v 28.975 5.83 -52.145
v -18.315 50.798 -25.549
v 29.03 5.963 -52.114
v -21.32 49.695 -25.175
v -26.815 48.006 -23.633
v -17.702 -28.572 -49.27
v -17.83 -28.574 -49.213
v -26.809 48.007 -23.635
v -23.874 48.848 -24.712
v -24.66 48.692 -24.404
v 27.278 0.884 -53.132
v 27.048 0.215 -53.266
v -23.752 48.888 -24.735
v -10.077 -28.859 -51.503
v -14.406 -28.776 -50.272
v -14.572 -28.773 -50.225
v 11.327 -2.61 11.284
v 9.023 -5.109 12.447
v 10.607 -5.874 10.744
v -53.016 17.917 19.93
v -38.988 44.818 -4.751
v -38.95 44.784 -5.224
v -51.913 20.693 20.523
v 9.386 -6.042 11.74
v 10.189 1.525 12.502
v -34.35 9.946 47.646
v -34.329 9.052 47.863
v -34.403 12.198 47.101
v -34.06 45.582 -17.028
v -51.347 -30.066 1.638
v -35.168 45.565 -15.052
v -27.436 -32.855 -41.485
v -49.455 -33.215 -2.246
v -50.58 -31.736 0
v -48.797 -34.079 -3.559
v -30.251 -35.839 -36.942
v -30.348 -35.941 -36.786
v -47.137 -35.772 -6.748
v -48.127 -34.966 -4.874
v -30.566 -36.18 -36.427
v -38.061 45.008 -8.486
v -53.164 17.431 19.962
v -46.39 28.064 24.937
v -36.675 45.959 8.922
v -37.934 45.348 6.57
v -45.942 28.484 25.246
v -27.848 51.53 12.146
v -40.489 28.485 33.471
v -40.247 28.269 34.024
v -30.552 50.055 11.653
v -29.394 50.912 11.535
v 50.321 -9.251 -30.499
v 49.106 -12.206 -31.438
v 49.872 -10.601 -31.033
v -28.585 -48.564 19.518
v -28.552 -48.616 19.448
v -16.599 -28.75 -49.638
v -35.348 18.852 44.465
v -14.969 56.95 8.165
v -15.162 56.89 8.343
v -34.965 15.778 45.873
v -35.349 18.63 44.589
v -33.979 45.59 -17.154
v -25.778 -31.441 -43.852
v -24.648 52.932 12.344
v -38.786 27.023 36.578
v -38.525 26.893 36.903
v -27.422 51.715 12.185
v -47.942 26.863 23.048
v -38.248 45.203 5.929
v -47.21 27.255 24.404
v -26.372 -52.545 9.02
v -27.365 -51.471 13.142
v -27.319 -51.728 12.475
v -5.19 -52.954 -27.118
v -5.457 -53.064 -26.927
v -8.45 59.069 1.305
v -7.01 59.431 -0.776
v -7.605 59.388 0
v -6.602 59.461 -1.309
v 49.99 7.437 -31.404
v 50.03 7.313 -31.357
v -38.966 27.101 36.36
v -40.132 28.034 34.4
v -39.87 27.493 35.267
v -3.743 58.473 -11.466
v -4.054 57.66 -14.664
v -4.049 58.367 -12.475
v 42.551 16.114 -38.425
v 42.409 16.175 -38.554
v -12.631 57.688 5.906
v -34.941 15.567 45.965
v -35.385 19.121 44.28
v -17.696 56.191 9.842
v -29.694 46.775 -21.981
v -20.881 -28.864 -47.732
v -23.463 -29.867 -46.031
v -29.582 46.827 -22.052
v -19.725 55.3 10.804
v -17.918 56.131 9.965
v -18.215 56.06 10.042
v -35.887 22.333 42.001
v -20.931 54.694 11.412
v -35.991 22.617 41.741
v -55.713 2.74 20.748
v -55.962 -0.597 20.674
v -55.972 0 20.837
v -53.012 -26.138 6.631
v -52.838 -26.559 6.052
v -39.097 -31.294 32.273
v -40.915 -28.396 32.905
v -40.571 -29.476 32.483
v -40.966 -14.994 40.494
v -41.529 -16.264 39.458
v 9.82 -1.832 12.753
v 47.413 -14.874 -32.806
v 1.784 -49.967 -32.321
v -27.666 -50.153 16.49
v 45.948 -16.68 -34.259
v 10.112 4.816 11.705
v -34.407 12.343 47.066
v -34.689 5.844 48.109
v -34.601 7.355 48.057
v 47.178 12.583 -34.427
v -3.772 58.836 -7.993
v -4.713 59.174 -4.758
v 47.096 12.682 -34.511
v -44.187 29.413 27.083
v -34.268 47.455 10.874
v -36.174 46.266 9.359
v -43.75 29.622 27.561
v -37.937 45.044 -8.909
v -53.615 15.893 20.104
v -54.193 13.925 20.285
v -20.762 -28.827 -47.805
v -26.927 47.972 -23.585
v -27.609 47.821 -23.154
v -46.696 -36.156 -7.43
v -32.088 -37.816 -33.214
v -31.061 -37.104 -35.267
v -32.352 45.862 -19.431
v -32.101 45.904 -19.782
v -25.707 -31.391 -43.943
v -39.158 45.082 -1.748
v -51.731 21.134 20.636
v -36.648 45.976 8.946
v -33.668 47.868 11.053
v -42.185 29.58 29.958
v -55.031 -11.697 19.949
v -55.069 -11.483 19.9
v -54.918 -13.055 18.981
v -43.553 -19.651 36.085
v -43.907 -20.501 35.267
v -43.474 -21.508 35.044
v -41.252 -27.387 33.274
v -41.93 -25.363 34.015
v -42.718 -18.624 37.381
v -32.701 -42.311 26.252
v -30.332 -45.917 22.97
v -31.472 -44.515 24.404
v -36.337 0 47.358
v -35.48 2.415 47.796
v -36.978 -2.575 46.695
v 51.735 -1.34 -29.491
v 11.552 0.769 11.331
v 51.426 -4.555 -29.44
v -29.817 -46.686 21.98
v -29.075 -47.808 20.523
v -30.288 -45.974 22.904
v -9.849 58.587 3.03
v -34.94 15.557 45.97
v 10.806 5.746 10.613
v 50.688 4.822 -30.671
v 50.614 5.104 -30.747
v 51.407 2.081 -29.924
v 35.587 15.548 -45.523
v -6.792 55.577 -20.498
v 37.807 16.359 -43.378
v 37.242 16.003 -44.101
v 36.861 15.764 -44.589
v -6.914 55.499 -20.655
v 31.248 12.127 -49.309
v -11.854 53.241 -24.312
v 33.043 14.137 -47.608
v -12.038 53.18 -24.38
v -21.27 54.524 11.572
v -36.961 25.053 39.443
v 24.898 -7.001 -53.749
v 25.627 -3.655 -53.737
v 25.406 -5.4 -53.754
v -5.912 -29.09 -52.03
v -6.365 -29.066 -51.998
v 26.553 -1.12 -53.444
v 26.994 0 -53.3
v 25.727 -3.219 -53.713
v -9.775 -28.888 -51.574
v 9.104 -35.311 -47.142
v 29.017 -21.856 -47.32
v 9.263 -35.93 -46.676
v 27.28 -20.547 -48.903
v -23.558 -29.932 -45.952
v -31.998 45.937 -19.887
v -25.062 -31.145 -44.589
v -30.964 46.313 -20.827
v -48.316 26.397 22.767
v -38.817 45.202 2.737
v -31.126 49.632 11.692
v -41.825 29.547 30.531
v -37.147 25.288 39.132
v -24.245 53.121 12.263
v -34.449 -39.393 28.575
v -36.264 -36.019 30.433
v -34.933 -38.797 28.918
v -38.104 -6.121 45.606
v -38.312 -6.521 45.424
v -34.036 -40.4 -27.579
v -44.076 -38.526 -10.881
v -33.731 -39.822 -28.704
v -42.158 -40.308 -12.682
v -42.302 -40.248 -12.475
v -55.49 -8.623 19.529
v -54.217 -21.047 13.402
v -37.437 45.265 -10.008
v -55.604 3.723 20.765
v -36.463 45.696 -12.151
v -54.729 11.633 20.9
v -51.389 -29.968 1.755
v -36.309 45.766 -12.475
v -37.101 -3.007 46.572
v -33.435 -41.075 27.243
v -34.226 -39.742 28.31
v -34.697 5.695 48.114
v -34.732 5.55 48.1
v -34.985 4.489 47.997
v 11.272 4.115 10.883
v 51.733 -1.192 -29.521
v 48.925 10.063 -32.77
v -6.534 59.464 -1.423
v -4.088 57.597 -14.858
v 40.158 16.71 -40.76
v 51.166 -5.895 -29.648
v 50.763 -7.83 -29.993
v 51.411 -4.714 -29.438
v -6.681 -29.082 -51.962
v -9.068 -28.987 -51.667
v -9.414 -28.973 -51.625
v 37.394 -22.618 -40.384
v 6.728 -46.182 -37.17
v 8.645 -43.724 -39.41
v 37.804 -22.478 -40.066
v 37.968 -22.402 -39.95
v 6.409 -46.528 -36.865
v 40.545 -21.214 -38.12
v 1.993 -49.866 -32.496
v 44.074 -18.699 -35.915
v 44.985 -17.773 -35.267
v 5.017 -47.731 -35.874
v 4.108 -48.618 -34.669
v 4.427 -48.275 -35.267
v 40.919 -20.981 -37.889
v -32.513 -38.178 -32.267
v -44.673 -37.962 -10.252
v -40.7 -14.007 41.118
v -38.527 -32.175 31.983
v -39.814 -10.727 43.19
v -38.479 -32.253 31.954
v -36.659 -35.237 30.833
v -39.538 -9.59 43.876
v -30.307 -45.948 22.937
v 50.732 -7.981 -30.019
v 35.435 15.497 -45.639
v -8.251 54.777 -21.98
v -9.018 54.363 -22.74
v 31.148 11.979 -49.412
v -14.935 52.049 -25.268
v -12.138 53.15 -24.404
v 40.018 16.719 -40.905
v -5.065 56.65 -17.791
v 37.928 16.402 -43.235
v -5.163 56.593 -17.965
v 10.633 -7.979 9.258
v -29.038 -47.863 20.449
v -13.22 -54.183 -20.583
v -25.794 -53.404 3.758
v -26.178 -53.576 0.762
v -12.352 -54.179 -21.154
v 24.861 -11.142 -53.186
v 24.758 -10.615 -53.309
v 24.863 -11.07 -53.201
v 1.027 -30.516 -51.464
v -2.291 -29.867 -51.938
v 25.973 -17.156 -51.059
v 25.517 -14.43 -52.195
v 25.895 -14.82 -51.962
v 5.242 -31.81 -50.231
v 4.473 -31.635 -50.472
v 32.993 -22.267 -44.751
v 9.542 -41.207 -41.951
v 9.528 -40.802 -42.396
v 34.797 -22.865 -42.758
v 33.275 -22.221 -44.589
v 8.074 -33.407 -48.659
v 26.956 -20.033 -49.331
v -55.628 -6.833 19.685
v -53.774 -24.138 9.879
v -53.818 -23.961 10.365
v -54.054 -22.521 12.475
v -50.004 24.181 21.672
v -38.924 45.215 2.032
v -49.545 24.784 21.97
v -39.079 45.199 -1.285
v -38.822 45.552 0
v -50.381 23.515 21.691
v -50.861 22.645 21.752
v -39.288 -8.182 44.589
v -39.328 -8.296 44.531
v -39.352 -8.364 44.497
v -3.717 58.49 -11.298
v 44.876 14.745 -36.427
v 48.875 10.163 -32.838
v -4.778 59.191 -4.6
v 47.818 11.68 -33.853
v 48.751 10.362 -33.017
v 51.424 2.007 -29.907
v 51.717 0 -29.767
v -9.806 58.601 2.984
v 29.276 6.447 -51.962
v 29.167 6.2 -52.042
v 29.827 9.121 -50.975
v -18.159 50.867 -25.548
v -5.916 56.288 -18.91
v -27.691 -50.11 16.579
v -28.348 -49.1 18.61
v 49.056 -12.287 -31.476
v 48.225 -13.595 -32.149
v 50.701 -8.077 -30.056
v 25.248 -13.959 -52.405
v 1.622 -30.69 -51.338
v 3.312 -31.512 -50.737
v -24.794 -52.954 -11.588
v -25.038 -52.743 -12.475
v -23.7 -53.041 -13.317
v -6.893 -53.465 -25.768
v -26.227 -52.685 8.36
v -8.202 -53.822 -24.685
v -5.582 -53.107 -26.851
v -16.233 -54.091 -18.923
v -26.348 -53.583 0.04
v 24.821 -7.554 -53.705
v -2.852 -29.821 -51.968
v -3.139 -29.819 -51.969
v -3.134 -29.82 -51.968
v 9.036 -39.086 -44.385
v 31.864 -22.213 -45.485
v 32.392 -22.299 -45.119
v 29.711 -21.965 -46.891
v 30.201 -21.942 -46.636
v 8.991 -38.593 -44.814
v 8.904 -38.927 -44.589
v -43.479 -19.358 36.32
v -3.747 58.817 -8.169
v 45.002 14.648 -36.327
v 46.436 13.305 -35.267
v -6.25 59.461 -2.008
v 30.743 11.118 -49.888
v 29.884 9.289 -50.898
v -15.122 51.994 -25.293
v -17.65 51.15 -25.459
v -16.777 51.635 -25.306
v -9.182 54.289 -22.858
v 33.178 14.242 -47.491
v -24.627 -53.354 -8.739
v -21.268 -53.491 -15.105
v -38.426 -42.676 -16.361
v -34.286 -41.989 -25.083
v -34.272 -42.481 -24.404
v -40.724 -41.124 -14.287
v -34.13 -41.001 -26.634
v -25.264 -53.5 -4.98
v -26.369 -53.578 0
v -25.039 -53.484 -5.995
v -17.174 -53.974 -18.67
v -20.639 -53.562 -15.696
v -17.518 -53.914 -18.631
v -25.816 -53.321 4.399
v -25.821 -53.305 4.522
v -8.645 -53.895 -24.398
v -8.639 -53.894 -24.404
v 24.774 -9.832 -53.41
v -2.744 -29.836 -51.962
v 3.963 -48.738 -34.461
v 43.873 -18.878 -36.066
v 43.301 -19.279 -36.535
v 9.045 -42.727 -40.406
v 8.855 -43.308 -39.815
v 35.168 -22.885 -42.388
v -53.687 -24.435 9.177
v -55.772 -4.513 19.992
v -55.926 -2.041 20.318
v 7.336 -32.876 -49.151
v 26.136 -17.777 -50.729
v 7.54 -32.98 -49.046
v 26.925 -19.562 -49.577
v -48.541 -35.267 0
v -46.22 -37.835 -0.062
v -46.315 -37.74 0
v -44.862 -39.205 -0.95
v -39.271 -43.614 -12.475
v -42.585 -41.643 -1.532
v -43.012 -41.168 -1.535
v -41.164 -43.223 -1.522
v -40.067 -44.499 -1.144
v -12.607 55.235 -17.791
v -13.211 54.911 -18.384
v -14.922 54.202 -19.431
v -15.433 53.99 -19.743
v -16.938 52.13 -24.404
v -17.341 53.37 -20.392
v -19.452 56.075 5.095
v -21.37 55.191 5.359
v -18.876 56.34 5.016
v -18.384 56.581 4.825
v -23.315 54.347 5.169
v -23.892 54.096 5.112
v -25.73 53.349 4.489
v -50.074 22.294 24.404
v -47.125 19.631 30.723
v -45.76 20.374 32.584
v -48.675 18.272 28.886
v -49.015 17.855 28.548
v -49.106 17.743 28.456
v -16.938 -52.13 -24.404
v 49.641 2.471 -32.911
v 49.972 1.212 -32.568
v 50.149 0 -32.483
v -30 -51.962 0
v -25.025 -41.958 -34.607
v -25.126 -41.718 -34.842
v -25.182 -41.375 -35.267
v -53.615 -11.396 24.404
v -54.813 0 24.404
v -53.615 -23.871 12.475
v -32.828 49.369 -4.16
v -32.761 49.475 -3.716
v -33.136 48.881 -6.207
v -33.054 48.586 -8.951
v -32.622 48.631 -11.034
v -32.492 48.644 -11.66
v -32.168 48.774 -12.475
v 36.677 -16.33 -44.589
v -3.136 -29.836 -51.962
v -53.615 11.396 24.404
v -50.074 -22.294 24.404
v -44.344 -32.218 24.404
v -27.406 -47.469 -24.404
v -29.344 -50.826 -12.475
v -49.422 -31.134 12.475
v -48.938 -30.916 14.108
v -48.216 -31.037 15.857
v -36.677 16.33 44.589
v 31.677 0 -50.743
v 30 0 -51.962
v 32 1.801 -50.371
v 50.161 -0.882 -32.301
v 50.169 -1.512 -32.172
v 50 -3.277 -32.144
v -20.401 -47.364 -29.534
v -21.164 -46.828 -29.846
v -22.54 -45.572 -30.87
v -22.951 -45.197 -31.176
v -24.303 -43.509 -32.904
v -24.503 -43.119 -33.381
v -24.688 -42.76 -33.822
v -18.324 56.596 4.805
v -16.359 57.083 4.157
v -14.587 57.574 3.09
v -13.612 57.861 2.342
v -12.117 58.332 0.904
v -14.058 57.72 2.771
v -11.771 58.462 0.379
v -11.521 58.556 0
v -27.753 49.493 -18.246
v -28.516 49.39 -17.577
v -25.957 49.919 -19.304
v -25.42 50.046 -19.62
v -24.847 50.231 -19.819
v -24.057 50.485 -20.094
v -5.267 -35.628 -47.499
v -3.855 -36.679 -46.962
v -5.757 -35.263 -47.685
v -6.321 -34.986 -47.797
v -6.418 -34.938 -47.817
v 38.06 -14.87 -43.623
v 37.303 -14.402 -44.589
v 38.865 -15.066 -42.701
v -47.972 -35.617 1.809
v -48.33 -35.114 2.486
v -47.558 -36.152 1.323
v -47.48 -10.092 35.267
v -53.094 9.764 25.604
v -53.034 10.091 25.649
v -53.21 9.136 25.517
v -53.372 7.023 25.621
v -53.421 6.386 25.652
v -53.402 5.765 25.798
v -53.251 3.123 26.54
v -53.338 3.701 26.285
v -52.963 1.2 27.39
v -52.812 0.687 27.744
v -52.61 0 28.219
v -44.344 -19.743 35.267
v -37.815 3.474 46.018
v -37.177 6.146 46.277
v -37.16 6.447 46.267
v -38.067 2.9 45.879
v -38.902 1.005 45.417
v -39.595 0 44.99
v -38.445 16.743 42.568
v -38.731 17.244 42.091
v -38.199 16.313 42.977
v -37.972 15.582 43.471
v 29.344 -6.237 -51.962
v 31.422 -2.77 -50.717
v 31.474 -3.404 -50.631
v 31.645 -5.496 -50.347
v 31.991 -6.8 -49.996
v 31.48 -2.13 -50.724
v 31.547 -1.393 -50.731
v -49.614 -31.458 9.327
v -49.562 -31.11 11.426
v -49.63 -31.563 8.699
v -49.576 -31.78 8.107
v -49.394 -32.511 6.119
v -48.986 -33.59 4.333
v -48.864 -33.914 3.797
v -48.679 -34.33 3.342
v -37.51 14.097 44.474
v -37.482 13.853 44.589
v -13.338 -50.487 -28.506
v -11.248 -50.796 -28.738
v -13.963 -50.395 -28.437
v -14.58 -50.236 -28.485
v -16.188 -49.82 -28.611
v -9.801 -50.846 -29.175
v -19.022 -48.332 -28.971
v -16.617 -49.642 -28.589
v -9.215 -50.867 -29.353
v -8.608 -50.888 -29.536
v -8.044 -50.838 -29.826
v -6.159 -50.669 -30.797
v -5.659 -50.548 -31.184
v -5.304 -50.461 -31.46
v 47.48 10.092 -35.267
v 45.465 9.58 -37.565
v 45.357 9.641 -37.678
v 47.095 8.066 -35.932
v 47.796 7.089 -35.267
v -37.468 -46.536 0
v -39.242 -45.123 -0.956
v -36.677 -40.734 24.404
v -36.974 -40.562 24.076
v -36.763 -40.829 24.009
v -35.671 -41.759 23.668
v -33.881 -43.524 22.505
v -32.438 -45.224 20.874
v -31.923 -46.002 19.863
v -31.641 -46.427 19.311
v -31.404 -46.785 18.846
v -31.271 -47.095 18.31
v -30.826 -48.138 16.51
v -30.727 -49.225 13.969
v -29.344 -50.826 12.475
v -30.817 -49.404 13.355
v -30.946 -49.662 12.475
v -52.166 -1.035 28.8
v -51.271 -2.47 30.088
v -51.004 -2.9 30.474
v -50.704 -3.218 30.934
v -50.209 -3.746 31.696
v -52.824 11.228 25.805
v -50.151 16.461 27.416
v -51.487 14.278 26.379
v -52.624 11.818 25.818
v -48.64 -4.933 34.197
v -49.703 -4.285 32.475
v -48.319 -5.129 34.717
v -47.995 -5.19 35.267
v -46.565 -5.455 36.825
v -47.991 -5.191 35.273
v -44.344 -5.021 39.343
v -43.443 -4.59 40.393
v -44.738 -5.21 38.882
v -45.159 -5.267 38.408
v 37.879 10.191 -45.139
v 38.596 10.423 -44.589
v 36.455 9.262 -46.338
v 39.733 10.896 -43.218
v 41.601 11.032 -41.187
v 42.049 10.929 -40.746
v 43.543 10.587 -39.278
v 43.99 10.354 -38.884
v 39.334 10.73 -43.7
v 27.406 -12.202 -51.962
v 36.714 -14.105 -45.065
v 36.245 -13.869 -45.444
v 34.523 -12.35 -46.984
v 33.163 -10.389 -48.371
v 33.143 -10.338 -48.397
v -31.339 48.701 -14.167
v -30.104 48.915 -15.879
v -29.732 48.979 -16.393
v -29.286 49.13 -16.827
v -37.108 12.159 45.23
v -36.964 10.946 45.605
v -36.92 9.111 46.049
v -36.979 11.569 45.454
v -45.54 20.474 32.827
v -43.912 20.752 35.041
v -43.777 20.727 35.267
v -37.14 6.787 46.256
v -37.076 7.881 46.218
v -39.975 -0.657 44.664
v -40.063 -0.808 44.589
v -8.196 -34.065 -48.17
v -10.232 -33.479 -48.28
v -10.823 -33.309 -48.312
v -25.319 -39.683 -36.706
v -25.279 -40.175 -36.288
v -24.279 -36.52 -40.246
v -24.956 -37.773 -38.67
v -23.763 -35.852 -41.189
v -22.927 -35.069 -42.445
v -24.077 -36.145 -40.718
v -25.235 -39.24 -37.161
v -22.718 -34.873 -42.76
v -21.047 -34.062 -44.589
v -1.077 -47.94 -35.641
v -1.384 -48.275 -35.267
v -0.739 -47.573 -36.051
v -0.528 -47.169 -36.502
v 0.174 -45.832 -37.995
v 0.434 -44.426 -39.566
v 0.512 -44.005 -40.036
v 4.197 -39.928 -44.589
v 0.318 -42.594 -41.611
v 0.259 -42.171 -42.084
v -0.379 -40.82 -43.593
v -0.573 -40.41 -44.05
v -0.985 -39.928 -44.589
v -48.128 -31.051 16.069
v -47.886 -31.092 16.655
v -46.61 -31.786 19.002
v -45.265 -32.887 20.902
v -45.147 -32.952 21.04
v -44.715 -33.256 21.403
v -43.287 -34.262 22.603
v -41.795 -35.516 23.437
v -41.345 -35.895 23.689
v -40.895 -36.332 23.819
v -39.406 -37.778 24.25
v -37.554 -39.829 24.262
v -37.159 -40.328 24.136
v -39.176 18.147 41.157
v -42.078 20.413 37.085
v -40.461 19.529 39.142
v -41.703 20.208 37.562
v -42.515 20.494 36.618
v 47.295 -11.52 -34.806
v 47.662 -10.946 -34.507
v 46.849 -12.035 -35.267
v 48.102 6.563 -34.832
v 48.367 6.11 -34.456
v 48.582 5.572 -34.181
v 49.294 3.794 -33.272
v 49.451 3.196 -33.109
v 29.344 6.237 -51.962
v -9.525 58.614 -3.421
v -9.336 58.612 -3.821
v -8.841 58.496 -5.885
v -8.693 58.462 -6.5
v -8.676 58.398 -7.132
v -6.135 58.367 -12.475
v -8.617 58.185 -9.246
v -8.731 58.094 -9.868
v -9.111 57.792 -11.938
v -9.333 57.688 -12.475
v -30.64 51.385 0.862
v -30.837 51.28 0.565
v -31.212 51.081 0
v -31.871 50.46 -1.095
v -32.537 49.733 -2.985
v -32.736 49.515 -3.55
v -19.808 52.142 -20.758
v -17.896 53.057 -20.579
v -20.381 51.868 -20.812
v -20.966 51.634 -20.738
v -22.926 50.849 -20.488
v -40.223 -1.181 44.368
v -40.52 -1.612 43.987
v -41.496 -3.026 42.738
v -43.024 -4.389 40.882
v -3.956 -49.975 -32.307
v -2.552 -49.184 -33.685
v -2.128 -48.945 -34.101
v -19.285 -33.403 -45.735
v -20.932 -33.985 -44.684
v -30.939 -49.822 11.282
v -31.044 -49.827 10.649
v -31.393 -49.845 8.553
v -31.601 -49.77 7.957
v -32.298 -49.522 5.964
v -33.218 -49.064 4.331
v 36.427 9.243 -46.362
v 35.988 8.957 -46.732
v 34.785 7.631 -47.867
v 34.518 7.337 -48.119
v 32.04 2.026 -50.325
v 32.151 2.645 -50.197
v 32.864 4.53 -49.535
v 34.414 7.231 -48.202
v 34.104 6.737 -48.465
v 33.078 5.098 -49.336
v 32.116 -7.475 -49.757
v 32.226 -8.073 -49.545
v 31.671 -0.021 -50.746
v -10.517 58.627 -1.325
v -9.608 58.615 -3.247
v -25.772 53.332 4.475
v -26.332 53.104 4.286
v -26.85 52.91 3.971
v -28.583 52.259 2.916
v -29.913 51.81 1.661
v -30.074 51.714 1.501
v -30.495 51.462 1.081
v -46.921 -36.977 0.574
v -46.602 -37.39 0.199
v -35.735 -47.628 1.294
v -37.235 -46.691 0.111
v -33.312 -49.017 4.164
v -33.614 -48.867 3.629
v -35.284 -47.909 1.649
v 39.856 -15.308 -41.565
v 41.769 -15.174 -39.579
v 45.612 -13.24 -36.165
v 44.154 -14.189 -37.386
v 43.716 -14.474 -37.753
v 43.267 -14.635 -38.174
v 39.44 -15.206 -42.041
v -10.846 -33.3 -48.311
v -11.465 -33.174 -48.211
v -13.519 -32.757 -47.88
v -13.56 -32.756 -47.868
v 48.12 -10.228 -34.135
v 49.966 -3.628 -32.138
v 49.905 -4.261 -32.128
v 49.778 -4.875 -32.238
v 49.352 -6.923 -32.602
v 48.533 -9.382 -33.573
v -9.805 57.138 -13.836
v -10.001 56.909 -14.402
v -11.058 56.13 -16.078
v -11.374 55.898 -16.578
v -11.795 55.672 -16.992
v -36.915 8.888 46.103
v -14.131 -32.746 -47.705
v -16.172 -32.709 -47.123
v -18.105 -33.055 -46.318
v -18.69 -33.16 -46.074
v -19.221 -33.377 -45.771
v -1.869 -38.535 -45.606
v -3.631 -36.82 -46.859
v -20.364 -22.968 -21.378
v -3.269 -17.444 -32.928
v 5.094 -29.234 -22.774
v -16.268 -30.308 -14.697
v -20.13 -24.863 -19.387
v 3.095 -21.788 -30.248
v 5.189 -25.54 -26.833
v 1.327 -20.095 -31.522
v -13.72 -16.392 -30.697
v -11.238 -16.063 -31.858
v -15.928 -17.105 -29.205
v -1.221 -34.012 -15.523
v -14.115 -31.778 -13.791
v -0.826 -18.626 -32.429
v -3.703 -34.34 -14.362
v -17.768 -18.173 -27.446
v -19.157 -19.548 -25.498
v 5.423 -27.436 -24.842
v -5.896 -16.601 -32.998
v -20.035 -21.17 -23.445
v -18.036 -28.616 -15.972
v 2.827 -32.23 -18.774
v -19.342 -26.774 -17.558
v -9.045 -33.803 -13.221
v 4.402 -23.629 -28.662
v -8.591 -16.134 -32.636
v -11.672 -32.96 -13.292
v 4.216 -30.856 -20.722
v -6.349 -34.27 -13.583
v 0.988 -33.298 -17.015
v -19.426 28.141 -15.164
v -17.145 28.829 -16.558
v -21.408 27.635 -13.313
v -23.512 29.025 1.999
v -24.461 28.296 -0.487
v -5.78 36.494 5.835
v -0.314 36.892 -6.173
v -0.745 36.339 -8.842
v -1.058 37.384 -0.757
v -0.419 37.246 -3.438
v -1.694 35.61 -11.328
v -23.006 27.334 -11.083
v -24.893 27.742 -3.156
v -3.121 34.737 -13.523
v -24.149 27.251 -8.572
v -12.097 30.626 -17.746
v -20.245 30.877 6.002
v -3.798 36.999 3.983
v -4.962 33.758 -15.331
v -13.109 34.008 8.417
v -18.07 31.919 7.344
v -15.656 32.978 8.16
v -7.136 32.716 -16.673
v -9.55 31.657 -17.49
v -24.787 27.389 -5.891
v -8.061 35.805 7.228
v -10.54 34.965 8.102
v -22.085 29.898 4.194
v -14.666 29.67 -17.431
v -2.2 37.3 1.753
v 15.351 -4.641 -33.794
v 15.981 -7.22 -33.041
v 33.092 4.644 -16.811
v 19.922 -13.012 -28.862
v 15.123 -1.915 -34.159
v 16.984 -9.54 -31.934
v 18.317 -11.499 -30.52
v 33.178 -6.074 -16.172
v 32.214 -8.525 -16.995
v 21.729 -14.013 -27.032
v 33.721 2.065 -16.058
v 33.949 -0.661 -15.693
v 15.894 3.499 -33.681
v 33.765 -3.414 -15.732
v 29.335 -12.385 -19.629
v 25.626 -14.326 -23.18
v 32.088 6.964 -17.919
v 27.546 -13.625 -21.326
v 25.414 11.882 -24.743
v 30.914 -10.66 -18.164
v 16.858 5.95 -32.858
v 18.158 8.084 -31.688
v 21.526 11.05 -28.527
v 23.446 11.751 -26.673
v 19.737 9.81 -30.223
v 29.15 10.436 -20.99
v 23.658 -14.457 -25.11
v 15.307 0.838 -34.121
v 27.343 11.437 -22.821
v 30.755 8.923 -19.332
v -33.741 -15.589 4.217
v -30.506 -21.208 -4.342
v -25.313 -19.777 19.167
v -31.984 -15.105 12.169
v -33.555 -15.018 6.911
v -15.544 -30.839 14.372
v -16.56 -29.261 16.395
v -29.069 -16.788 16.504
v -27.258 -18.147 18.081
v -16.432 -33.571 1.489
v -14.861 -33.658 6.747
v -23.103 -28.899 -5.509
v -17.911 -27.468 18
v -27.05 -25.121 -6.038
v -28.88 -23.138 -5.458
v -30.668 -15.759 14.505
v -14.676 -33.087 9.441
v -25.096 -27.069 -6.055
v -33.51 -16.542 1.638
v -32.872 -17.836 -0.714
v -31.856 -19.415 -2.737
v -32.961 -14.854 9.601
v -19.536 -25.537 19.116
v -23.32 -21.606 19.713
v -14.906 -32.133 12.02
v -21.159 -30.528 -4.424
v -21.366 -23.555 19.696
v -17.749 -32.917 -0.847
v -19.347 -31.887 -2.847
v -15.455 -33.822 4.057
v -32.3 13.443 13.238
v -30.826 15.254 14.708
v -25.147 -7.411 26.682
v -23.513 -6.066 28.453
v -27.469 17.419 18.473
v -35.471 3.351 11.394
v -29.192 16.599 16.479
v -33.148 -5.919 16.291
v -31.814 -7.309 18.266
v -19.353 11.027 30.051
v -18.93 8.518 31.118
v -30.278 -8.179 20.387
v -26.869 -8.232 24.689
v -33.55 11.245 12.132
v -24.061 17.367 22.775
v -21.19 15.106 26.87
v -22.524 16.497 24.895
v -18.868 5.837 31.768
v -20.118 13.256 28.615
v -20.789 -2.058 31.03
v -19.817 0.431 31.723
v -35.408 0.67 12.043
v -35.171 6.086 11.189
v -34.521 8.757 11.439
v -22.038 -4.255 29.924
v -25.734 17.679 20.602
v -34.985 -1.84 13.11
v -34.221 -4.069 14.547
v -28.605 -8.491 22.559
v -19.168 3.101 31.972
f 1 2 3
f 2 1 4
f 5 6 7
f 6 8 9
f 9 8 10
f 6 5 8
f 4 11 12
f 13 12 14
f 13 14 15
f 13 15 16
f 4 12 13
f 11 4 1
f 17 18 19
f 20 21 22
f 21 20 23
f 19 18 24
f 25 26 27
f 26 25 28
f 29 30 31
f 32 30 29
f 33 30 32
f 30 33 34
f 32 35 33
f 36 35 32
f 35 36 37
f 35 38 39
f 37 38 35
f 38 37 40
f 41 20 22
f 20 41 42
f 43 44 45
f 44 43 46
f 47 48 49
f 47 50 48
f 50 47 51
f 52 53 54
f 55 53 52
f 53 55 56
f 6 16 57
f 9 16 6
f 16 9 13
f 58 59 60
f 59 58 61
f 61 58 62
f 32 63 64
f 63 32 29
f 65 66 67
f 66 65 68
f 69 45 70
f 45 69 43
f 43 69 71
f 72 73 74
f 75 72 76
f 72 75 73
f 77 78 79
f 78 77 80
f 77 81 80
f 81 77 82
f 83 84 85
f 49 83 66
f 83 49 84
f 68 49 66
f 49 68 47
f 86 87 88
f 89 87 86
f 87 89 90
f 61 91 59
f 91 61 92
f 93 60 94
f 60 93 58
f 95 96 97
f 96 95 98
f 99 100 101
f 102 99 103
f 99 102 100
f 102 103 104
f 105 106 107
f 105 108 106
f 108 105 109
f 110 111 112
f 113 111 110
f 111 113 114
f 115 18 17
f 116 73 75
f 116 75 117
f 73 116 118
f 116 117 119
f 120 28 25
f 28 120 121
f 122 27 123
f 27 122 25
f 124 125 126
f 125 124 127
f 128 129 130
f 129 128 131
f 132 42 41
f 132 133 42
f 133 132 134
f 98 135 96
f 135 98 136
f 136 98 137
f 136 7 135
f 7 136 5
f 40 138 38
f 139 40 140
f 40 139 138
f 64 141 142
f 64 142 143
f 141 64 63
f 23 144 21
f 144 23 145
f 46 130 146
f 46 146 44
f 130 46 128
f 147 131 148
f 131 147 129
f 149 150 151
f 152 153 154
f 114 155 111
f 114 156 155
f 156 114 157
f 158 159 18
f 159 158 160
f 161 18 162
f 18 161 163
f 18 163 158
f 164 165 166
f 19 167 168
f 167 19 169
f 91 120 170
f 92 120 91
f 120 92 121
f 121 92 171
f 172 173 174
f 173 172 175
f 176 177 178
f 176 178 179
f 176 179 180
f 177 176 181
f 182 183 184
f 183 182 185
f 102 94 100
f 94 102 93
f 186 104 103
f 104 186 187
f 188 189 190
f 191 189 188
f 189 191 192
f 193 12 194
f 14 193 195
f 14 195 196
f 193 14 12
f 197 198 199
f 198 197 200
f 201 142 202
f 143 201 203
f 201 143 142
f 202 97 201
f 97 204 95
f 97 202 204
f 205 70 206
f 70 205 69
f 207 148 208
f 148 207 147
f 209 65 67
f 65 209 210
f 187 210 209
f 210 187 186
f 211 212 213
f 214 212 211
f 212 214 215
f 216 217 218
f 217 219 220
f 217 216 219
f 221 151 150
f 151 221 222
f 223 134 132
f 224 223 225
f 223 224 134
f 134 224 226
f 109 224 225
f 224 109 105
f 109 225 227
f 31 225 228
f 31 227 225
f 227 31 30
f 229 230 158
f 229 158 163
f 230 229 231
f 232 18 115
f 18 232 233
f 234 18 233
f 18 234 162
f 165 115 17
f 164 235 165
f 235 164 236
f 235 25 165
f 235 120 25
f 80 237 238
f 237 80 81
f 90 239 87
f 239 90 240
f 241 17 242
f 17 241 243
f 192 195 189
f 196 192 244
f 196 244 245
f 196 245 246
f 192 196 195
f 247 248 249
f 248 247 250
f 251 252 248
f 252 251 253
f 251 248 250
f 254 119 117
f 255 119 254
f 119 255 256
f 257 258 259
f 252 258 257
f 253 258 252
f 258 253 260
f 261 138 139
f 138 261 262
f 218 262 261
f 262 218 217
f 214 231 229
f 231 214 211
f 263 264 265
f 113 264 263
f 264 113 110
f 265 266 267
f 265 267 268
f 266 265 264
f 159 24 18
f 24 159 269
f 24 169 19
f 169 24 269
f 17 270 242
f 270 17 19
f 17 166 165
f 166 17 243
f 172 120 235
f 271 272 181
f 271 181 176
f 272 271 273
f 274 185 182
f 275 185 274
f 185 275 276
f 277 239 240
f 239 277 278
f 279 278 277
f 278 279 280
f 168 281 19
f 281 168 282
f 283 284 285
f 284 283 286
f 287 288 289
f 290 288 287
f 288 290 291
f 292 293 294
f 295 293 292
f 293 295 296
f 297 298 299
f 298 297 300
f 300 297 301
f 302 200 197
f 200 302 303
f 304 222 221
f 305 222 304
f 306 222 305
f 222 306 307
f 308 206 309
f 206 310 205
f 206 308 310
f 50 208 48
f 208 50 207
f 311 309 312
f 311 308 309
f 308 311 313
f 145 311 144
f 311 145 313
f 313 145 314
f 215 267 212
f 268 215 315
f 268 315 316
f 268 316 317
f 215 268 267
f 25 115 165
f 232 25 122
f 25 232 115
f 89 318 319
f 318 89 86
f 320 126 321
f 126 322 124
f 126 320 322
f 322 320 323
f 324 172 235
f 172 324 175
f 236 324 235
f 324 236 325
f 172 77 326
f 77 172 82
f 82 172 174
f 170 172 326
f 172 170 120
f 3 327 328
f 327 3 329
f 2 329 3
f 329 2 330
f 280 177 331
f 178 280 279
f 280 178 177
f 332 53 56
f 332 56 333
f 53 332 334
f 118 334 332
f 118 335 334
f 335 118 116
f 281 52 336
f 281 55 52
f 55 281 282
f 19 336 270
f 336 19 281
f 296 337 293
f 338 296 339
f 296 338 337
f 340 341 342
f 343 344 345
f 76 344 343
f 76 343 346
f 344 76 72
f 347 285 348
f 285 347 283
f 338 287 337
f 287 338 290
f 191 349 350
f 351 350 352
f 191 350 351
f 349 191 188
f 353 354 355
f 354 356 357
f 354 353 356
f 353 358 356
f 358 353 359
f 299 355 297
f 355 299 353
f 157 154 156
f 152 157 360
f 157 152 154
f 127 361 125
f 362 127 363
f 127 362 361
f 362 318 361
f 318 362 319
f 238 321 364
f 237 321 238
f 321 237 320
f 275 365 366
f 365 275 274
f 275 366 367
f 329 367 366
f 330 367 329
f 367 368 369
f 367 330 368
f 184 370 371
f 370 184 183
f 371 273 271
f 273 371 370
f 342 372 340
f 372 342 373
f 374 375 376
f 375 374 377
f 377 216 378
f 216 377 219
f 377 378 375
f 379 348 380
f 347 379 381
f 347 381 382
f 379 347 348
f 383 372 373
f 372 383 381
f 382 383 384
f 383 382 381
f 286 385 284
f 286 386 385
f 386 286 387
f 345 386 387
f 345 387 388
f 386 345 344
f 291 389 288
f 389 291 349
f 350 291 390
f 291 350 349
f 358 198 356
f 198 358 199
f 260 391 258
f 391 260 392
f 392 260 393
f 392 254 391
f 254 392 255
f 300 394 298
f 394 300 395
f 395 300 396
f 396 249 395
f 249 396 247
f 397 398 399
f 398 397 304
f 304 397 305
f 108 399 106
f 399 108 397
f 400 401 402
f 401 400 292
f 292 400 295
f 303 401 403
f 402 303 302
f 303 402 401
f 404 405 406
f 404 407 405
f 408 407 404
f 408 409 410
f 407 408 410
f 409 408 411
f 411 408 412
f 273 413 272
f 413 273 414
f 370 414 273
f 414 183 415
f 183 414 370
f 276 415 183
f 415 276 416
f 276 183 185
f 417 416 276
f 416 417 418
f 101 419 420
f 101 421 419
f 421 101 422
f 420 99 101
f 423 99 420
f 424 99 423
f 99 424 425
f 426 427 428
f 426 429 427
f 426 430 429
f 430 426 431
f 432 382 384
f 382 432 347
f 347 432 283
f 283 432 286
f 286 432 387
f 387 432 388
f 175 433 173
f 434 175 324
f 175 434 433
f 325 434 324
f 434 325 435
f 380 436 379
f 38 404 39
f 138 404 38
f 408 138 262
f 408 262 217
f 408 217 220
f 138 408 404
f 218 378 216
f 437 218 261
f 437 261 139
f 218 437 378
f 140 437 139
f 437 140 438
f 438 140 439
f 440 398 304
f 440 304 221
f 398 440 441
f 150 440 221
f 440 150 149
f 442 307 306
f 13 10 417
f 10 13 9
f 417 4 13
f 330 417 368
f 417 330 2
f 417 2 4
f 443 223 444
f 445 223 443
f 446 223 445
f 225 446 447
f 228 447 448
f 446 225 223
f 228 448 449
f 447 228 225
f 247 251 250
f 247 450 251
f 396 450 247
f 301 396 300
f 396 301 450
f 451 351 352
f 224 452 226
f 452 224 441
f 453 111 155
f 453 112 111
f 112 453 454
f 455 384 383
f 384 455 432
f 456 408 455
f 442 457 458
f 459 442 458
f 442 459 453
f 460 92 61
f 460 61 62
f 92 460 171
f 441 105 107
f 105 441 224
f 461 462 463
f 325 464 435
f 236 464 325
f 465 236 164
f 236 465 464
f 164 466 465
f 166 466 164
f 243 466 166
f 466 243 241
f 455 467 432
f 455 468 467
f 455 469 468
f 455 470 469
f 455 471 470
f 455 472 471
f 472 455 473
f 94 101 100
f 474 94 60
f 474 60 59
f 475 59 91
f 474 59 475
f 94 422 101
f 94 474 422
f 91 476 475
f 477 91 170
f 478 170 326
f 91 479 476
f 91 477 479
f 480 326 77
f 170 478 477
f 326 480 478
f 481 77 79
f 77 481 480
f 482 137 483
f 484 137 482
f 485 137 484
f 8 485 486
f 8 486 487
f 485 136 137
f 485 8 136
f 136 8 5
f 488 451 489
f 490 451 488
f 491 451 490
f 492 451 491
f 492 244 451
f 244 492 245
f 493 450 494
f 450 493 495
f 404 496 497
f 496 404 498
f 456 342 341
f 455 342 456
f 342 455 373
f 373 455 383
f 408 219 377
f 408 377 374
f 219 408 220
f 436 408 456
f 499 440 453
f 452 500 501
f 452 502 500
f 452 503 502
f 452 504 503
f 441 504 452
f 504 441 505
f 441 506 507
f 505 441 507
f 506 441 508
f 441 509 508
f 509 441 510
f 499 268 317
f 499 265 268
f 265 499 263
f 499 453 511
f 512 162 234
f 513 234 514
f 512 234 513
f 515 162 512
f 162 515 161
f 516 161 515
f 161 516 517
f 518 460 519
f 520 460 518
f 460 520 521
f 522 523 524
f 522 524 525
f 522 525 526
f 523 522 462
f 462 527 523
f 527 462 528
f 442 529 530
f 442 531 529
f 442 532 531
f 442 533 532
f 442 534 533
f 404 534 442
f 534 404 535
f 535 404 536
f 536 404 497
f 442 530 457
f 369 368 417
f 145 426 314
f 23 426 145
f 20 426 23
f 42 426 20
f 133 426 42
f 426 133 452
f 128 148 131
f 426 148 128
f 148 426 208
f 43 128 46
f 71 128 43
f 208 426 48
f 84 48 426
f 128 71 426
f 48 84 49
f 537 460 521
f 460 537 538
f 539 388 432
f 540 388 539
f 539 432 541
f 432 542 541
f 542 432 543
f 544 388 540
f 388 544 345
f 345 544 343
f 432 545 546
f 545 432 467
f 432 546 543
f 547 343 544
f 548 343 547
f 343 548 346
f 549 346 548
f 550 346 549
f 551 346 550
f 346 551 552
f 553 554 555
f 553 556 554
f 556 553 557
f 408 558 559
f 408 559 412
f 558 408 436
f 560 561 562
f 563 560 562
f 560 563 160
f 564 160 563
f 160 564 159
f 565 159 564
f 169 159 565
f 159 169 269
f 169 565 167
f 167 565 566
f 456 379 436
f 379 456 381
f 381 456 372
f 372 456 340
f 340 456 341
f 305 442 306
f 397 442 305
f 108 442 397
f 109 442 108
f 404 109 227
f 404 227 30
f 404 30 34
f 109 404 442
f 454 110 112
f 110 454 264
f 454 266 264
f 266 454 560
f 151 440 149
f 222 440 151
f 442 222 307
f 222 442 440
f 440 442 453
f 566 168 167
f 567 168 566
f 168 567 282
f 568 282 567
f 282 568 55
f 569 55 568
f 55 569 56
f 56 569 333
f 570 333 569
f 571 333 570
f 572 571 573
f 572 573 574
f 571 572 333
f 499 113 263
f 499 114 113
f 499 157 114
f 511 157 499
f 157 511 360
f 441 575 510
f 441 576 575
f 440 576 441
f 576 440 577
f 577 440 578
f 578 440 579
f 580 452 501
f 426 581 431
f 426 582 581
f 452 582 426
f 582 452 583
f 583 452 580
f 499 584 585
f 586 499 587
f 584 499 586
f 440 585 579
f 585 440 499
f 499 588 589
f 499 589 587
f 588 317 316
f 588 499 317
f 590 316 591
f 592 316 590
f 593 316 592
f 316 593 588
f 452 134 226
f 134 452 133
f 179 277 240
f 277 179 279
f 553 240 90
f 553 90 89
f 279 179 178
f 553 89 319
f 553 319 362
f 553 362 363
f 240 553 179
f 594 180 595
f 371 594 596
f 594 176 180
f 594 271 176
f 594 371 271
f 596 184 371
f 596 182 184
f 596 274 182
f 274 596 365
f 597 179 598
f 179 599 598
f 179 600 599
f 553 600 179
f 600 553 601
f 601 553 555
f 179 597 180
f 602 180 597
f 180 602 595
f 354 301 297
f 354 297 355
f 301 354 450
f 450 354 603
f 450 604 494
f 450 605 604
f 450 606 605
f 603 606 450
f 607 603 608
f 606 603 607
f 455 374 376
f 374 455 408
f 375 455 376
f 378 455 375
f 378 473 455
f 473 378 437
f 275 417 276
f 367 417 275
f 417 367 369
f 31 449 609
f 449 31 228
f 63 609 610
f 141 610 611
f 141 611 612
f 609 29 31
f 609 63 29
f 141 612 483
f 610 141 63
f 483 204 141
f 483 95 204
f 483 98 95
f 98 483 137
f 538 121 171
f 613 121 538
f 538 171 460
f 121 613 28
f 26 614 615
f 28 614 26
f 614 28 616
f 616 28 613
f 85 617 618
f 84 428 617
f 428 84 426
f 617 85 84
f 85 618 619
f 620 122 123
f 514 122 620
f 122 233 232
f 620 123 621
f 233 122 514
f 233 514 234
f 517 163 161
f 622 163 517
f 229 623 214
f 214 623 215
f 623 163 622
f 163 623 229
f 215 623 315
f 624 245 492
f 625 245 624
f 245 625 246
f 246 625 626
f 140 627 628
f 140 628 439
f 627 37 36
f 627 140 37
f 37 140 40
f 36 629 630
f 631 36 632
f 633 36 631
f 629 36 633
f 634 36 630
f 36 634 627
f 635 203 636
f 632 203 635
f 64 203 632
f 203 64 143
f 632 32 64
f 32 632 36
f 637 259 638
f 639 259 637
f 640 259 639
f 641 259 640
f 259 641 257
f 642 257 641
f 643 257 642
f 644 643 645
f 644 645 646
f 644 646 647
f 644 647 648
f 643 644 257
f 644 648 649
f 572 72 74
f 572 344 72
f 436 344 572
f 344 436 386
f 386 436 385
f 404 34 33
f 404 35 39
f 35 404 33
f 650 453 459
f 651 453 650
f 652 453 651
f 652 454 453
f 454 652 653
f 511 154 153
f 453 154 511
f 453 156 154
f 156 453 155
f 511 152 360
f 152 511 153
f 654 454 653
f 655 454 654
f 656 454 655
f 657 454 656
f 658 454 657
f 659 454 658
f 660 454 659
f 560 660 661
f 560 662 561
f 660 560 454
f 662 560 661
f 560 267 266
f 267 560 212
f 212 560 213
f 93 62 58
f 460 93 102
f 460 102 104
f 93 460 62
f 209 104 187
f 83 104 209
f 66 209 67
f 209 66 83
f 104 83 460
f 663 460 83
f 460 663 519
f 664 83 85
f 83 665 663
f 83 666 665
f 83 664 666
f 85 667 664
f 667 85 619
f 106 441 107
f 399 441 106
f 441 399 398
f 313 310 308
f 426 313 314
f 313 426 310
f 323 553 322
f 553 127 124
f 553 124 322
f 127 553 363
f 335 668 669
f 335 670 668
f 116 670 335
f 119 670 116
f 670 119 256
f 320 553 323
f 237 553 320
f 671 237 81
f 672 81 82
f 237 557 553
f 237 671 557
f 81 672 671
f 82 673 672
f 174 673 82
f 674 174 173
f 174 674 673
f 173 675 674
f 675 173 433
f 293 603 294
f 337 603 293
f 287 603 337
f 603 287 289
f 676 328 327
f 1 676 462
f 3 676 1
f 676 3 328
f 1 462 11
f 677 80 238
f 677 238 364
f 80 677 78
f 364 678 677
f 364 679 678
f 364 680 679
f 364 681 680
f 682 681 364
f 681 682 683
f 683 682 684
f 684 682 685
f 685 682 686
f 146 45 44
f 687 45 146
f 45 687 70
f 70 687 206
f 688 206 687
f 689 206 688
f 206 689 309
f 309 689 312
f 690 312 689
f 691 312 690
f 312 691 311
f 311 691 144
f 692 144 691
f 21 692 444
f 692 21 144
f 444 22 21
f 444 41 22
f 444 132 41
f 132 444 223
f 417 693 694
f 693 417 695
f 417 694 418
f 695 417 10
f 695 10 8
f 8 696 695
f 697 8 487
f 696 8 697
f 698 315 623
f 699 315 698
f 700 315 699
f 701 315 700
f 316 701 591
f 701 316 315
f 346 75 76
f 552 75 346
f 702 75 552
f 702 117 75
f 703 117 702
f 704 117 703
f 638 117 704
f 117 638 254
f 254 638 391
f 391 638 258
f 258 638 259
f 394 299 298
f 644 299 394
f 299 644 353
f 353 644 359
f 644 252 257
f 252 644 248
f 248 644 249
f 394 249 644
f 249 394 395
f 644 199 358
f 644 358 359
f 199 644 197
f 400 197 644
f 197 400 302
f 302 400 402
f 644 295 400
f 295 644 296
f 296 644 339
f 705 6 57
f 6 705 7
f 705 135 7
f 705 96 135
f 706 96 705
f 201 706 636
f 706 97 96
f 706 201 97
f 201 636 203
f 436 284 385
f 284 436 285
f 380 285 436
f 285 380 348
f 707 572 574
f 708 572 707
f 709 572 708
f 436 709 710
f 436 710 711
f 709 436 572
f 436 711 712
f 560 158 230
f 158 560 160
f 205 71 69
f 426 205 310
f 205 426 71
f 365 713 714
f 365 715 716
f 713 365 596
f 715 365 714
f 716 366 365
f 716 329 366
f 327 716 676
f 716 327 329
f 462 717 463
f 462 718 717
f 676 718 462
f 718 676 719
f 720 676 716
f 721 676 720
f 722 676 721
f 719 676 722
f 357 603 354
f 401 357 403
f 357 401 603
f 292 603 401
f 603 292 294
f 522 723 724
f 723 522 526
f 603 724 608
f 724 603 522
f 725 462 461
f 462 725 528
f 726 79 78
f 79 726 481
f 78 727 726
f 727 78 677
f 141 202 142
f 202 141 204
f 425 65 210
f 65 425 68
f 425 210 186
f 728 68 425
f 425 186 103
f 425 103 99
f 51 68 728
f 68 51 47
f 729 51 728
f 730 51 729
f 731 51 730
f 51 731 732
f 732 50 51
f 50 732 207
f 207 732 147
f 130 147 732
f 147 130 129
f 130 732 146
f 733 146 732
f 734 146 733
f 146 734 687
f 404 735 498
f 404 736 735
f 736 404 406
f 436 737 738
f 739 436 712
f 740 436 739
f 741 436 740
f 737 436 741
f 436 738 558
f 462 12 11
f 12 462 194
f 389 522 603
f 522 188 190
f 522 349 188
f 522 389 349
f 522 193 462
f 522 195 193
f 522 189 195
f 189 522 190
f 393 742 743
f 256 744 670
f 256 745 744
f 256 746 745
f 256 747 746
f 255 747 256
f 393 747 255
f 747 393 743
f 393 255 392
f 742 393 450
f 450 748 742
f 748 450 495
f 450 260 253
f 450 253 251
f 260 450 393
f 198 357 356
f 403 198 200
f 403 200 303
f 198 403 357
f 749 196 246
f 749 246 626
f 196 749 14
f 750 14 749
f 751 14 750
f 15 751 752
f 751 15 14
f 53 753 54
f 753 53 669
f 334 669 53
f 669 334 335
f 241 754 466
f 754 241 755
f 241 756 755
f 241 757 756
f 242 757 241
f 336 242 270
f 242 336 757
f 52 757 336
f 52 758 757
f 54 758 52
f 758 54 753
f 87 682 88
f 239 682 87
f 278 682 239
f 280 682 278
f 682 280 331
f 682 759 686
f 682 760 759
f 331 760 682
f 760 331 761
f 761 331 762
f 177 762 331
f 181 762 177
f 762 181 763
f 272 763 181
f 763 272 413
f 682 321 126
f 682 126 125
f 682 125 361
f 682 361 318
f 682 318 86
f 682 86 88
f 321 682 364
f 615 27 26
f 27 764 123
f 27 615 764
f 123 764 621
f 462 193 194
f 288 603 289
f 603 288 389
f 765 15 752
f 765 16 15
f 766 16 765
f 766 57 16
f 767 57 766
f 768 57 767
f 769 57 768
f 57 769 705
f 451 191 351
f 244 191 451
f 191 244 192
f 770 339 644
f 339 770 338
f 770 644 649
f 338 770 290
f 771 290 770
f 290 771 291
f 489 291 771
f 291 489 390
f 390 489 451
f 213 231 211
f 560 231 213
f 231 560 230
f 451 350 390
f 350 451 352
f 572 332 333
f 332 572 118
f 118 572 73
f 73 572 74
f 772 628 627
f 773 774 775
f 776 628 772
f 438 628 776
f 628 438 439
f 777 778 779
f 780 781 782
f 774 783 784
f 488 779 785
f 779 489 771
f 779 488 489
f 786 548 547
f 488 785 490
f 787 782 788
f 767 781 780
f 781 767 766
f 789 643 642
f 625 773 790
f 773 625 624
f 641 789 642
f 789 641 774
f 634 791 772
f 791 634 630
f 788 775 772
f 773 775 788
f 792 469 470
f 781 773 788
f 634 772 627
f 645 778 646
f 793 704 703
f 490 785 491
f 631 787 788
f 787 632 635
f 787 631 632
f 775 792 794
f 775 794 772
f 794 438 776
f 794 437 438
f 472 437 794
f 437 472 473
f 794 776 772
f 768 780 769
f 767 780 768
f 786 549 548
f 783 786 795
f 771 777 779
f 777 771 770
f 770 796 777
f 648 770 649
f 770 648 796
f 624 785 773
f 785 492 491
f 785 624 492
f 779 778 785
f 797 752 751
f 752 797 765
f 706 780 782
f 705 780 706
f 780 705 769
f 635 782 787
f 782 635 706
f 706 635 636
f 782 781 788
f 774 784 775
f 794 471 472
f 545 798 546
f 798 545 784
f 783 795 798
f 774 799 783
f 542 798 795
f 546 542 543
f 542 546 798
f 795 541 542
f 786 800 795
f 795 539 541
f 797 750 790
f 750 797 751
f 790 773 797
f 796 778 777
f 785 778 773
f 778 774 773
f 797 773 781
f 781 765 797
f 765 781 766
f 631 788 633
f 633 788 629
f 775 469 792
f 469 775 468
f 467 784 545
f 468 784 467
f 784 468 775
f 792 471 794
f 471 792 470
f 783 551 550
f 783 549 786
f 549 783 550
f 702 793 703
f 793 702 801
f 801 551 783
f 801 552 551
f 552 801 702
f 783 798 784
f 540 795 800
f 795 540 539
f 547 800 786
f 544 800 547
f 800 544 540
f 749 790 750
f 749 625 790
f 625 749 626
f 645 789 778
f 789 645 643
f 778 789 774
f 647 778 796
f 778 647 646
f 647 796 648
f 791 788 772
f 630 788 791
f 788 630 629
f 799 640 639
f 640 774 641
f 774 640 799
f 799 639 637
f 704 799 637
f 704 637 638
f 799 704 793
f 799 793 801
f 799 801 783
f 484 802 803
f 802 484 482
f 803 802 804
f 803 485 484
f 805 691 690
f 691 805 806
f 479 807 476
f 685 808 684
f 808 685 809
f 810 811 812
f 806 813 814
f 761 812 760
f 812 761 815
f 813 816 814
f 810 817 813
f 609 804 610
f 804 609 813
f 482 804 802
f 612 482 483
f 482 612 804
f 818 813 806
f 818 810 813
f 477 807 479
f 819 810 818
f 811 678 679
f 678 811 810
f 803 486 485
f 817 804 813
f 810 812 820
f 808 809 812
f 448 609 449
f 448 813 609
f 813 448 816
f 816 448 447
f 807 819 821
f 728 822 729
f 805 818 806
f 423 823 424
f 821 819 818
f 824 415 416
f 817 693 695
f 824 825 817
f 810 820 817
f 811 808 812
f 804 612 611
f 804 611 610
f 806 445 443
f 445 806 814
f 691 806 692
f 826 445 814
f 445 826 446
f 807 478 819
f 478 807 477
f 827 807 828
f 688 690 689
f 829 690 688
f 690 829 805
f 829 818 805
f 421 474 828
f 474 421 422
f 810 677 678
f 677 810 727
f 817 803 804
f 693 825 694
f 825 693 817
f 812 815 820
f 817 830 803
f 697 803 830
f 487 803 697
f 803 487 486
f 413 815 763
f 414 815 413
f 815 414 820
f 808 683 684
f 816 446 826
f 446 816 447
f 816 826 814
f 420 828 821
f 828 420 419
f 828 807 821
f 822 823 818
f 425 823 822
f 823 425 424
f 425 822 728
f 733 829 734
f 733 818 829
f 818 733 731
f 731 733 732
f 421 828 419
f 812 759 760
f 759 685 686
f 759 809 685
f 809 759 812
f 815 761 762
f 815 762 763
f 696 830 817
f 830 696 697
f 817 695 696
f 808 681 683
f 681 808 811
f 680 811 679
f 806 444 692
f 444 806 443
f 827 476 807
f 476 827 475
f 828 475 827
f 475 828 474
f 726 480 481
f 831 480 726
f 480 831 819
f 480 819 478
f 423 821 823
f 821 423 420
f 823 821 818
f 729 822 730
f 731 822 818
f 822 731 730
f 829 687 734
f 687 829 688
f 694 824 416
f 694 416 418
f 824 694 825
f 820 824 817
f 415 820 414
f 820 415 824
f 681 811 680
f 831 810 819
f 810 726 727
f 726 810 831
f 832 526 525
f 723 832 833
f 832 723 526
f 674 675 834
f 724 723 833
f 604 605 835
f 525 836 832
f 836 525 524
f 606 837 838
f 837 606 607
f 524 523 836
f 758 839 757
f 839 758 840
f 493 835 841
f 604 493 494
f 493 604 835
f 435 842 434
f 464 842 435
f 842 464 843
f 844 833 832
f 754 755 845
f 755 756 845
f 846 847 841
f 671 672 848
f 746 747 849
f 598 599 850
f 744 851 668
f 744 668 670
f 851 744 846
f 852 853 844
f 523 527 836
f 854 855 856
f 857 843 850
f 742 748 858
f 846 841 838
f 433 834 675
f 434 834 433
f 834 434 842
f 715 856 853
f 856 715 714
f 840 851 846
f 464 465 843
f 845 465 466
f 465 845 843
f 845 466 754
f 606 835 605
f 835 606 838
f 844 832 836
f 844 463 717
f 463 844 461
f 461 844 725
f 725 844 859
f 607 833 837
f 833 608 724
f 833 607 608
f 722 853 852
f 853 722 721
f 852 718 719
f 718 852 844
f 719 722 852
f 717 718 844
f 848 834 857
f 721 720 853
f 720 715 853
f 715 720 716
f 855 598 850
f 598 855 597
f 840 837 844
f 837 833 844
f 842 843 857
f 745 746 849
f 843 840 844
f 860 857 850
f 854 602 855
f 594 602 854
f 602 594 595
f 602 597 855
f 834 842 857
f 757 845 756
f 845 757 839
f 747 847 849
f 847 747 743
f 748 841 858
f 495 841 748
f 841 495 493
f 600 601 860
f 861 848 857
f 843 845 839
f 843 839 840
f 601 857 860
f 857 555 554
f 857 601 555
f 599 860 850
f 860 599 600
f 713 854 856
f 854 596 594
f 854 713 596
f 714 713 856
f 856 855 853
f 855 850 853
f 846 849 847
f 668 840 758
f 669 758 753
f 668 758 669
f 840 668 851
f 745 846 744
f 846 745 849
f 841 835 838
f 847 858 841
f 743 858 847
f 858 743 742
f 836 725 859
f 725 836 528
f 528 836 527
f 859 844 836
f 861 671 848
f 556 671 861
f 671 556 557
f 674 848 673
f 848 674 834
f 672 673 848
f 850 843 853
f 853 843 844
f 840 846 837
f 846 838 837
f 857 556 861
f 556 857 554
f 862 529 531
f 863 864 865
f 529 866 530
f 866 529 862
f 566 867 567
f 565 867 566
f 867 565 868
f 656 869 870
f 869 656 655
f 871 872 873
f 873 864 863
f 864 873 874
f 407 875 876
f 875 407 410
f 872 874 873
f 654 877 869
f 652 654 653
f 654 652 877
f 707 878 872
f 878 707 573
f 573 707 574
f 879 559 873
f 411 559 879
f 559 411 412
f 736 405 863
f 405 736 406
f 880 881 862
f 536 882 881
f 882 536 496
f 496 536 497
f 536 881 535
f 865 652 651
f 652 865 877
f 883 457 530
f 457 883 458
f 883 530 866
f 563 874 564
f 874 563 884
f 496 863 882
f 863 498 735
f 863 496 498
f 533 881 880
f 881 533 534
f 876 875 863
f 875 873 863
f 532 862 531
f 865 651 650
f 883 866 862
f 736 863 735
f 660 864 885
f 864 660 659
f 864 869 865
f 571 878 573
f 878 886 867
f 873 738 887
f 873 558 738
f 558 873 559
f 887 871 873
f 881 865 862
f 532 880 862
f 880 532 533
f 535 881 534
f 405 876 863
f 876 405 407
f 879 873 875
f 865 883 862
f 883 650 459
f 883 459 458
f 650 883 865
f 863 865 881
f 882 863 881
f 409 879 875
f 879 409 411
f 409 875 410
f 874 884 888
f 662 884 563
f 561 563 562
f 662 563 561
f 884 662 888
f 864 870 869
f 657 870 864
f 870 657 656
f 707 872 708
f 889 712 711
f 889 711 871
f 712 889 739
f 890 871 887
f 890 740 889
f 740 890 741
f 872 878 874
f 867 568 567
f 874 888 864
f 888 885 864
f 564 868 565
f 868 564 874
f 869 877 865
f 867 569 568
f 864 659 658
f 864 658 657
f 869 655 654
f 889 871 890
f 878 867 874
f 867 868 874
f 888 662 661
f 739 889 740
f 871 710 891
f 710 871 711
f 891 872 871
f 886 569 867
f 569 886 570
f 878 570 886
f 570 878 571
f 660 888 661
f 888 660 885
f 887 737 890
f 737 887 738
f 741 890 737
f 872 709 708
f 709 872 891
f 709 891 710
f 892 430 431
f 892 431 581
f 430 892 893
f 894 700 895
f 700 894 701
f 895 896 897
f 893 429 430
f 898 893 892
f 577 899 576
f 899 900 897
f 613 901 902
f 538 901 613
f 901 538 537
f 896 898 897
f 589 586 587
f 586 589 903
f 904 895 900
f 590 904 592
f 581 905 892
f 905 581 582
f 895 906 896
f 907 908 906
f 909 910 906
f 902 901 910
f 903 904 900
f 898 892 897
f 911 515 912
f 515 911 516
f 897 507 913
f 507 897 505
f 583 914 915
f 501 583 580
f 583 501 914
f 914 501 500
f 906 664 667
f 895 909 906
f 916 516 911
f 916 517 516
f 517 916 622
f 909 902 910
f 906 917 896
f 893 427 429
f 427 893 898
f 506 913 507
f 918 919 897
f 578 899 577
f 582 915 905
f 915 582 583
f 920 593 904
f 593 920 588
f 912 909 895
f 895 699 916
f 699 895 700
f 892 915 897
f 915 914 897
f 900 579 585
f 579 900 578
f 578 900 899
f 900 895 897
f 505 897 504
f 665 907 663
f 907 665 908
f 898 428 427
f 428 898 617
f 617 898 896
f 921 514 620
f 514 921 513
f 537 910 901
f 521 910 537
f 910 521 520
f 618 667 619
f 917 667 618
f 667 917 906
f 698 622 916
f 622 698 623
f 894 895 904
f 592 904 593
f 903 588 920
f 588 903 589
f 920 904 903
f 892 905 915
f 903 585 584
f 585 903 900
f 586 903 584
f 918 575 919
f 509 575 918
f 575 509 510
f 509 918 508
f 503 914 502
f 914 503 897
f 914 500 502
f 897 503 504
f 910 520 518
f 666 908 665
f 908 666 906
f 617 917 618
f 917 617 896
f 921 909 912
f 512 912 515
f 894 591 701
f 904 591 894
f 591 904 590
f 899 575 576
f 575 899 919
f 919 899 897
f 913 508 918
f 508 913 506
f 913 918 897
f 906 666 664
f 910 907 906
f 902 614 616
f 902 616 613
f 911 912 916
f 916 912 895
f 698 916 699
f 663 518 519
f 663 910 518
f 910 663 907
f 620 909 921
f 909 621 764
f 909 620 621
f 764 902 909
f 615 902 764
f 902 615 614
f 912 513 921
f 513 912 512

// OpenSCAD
difference() {
	intersection() {
		hull() {
			rotate(a = -121.8002487075, v = [0.2416956723, -0.8147986889, 0.0000000000]) {
				rotate(a = -90.0000000000, v = [-0.3826834324, -0.9238795325, 0.0000000000]) {
					cylinder(h = 60, r = 16.2000000000);
				}
			}
			rotate(a = -121.8002487075, v = [0.2416956723, -0.8147986889, 0.0000000000]) {
				rotate(a = -90.0000000000, v = [0.9914448614, 0.1305261922, -0.0000000000]) {
					cylinder(h = 60, r = 16.2000000000);
				}
			}
			rotate(a = -121.8002487075, v = [0.2416956723, -0.8147986889, 0.0000000000]) {
				rotate(a = -20.3482733305, v = [-0.1519712042, -0.3127585874, 0.0000000000]) {
					cylinder(h = 60, r = 16.2000000000);
				}
			}
			rotate(a = -121.8002487075, v = [0.2416956723, -0.8147986889, 0.0000000000]) {
				rotate(a = -146.5585275075, v = [-0.3687026260, -0.4095765180, 0.0000000000]) {
					cylinder(h = 60, r = 16.2000000000);
				}
			}
			rotate(a = -121.8002487075, v = [0.2416956723, -0.8147986889, 0.0000000000]) {
				rotate(a = -157.7736717199, v = [0.2891837505, 0.2438402662, -0.0000000000]) {
					cylinder(h = 60, r = 16.2000000000);
				}
			}
		}
		sphere(r = 60);
	}
	union() {
		rotate(a = -121.8002487075, v = [0.2416956723, -0.8147986889, 0.0000000000]) {
			rotate(a = -90.0000000000, v = [-0.3826834324, -0.9238795325, 0.0000000000]) {
				translate(v = [0, 0, 35]) {
					cylinder(h = 100, r = 13.2000000000);
				}
			}
		}
		rotate(a = -121.8002487075, v = [0.2416956723, -0.8147986889, 0.0000000000]) {
			rotate(a = -90.0000000000, v = [0.9914448614, 0.1305261922, -0.0000000000]) {
				translate(v = [0, 0, 35]) {
					cylinder(h = 100, r = 13.2000000000);
				}
			}
		}
		rotate(a = -121.8002487075, v = [0.2416956723, -0.8147986889, 0.0000000000]) {
			rotate(a = -20.3482733305, v = [-0.1519712042, -0.3127585874, 0.0000000000]) {
				translate(v = [0, 0, 35]) {
					cylinder(h = 100, r = 13.2000000000);
				}
			}
		}
		rotate(a = -121.8002487075, v = [0.2416956723, -0.8147986889, 0.0000000000]) {
			rotate(a = -146.5585275075, v = [-0.3687026260, -0.4095765180, 0.0000000000]) {
				translate(v = [0, 0, 35]) {
					cylinder(h = 100, r = 13.2000000000);
				}
			}
		}
		rotate(a = -121.8002487075, v = [0.2416956723, -0.8147986889, 0.0000000000]) {
			rotate(a = -157.7736717199, v = [0.2891837505, 0.2438402662, -0.0000000000]) {
				translate(v = [0, 0, 35]) {
					cylinder(h = 100, r = 13.2000000000);
				}
			}
		}
	}
}
